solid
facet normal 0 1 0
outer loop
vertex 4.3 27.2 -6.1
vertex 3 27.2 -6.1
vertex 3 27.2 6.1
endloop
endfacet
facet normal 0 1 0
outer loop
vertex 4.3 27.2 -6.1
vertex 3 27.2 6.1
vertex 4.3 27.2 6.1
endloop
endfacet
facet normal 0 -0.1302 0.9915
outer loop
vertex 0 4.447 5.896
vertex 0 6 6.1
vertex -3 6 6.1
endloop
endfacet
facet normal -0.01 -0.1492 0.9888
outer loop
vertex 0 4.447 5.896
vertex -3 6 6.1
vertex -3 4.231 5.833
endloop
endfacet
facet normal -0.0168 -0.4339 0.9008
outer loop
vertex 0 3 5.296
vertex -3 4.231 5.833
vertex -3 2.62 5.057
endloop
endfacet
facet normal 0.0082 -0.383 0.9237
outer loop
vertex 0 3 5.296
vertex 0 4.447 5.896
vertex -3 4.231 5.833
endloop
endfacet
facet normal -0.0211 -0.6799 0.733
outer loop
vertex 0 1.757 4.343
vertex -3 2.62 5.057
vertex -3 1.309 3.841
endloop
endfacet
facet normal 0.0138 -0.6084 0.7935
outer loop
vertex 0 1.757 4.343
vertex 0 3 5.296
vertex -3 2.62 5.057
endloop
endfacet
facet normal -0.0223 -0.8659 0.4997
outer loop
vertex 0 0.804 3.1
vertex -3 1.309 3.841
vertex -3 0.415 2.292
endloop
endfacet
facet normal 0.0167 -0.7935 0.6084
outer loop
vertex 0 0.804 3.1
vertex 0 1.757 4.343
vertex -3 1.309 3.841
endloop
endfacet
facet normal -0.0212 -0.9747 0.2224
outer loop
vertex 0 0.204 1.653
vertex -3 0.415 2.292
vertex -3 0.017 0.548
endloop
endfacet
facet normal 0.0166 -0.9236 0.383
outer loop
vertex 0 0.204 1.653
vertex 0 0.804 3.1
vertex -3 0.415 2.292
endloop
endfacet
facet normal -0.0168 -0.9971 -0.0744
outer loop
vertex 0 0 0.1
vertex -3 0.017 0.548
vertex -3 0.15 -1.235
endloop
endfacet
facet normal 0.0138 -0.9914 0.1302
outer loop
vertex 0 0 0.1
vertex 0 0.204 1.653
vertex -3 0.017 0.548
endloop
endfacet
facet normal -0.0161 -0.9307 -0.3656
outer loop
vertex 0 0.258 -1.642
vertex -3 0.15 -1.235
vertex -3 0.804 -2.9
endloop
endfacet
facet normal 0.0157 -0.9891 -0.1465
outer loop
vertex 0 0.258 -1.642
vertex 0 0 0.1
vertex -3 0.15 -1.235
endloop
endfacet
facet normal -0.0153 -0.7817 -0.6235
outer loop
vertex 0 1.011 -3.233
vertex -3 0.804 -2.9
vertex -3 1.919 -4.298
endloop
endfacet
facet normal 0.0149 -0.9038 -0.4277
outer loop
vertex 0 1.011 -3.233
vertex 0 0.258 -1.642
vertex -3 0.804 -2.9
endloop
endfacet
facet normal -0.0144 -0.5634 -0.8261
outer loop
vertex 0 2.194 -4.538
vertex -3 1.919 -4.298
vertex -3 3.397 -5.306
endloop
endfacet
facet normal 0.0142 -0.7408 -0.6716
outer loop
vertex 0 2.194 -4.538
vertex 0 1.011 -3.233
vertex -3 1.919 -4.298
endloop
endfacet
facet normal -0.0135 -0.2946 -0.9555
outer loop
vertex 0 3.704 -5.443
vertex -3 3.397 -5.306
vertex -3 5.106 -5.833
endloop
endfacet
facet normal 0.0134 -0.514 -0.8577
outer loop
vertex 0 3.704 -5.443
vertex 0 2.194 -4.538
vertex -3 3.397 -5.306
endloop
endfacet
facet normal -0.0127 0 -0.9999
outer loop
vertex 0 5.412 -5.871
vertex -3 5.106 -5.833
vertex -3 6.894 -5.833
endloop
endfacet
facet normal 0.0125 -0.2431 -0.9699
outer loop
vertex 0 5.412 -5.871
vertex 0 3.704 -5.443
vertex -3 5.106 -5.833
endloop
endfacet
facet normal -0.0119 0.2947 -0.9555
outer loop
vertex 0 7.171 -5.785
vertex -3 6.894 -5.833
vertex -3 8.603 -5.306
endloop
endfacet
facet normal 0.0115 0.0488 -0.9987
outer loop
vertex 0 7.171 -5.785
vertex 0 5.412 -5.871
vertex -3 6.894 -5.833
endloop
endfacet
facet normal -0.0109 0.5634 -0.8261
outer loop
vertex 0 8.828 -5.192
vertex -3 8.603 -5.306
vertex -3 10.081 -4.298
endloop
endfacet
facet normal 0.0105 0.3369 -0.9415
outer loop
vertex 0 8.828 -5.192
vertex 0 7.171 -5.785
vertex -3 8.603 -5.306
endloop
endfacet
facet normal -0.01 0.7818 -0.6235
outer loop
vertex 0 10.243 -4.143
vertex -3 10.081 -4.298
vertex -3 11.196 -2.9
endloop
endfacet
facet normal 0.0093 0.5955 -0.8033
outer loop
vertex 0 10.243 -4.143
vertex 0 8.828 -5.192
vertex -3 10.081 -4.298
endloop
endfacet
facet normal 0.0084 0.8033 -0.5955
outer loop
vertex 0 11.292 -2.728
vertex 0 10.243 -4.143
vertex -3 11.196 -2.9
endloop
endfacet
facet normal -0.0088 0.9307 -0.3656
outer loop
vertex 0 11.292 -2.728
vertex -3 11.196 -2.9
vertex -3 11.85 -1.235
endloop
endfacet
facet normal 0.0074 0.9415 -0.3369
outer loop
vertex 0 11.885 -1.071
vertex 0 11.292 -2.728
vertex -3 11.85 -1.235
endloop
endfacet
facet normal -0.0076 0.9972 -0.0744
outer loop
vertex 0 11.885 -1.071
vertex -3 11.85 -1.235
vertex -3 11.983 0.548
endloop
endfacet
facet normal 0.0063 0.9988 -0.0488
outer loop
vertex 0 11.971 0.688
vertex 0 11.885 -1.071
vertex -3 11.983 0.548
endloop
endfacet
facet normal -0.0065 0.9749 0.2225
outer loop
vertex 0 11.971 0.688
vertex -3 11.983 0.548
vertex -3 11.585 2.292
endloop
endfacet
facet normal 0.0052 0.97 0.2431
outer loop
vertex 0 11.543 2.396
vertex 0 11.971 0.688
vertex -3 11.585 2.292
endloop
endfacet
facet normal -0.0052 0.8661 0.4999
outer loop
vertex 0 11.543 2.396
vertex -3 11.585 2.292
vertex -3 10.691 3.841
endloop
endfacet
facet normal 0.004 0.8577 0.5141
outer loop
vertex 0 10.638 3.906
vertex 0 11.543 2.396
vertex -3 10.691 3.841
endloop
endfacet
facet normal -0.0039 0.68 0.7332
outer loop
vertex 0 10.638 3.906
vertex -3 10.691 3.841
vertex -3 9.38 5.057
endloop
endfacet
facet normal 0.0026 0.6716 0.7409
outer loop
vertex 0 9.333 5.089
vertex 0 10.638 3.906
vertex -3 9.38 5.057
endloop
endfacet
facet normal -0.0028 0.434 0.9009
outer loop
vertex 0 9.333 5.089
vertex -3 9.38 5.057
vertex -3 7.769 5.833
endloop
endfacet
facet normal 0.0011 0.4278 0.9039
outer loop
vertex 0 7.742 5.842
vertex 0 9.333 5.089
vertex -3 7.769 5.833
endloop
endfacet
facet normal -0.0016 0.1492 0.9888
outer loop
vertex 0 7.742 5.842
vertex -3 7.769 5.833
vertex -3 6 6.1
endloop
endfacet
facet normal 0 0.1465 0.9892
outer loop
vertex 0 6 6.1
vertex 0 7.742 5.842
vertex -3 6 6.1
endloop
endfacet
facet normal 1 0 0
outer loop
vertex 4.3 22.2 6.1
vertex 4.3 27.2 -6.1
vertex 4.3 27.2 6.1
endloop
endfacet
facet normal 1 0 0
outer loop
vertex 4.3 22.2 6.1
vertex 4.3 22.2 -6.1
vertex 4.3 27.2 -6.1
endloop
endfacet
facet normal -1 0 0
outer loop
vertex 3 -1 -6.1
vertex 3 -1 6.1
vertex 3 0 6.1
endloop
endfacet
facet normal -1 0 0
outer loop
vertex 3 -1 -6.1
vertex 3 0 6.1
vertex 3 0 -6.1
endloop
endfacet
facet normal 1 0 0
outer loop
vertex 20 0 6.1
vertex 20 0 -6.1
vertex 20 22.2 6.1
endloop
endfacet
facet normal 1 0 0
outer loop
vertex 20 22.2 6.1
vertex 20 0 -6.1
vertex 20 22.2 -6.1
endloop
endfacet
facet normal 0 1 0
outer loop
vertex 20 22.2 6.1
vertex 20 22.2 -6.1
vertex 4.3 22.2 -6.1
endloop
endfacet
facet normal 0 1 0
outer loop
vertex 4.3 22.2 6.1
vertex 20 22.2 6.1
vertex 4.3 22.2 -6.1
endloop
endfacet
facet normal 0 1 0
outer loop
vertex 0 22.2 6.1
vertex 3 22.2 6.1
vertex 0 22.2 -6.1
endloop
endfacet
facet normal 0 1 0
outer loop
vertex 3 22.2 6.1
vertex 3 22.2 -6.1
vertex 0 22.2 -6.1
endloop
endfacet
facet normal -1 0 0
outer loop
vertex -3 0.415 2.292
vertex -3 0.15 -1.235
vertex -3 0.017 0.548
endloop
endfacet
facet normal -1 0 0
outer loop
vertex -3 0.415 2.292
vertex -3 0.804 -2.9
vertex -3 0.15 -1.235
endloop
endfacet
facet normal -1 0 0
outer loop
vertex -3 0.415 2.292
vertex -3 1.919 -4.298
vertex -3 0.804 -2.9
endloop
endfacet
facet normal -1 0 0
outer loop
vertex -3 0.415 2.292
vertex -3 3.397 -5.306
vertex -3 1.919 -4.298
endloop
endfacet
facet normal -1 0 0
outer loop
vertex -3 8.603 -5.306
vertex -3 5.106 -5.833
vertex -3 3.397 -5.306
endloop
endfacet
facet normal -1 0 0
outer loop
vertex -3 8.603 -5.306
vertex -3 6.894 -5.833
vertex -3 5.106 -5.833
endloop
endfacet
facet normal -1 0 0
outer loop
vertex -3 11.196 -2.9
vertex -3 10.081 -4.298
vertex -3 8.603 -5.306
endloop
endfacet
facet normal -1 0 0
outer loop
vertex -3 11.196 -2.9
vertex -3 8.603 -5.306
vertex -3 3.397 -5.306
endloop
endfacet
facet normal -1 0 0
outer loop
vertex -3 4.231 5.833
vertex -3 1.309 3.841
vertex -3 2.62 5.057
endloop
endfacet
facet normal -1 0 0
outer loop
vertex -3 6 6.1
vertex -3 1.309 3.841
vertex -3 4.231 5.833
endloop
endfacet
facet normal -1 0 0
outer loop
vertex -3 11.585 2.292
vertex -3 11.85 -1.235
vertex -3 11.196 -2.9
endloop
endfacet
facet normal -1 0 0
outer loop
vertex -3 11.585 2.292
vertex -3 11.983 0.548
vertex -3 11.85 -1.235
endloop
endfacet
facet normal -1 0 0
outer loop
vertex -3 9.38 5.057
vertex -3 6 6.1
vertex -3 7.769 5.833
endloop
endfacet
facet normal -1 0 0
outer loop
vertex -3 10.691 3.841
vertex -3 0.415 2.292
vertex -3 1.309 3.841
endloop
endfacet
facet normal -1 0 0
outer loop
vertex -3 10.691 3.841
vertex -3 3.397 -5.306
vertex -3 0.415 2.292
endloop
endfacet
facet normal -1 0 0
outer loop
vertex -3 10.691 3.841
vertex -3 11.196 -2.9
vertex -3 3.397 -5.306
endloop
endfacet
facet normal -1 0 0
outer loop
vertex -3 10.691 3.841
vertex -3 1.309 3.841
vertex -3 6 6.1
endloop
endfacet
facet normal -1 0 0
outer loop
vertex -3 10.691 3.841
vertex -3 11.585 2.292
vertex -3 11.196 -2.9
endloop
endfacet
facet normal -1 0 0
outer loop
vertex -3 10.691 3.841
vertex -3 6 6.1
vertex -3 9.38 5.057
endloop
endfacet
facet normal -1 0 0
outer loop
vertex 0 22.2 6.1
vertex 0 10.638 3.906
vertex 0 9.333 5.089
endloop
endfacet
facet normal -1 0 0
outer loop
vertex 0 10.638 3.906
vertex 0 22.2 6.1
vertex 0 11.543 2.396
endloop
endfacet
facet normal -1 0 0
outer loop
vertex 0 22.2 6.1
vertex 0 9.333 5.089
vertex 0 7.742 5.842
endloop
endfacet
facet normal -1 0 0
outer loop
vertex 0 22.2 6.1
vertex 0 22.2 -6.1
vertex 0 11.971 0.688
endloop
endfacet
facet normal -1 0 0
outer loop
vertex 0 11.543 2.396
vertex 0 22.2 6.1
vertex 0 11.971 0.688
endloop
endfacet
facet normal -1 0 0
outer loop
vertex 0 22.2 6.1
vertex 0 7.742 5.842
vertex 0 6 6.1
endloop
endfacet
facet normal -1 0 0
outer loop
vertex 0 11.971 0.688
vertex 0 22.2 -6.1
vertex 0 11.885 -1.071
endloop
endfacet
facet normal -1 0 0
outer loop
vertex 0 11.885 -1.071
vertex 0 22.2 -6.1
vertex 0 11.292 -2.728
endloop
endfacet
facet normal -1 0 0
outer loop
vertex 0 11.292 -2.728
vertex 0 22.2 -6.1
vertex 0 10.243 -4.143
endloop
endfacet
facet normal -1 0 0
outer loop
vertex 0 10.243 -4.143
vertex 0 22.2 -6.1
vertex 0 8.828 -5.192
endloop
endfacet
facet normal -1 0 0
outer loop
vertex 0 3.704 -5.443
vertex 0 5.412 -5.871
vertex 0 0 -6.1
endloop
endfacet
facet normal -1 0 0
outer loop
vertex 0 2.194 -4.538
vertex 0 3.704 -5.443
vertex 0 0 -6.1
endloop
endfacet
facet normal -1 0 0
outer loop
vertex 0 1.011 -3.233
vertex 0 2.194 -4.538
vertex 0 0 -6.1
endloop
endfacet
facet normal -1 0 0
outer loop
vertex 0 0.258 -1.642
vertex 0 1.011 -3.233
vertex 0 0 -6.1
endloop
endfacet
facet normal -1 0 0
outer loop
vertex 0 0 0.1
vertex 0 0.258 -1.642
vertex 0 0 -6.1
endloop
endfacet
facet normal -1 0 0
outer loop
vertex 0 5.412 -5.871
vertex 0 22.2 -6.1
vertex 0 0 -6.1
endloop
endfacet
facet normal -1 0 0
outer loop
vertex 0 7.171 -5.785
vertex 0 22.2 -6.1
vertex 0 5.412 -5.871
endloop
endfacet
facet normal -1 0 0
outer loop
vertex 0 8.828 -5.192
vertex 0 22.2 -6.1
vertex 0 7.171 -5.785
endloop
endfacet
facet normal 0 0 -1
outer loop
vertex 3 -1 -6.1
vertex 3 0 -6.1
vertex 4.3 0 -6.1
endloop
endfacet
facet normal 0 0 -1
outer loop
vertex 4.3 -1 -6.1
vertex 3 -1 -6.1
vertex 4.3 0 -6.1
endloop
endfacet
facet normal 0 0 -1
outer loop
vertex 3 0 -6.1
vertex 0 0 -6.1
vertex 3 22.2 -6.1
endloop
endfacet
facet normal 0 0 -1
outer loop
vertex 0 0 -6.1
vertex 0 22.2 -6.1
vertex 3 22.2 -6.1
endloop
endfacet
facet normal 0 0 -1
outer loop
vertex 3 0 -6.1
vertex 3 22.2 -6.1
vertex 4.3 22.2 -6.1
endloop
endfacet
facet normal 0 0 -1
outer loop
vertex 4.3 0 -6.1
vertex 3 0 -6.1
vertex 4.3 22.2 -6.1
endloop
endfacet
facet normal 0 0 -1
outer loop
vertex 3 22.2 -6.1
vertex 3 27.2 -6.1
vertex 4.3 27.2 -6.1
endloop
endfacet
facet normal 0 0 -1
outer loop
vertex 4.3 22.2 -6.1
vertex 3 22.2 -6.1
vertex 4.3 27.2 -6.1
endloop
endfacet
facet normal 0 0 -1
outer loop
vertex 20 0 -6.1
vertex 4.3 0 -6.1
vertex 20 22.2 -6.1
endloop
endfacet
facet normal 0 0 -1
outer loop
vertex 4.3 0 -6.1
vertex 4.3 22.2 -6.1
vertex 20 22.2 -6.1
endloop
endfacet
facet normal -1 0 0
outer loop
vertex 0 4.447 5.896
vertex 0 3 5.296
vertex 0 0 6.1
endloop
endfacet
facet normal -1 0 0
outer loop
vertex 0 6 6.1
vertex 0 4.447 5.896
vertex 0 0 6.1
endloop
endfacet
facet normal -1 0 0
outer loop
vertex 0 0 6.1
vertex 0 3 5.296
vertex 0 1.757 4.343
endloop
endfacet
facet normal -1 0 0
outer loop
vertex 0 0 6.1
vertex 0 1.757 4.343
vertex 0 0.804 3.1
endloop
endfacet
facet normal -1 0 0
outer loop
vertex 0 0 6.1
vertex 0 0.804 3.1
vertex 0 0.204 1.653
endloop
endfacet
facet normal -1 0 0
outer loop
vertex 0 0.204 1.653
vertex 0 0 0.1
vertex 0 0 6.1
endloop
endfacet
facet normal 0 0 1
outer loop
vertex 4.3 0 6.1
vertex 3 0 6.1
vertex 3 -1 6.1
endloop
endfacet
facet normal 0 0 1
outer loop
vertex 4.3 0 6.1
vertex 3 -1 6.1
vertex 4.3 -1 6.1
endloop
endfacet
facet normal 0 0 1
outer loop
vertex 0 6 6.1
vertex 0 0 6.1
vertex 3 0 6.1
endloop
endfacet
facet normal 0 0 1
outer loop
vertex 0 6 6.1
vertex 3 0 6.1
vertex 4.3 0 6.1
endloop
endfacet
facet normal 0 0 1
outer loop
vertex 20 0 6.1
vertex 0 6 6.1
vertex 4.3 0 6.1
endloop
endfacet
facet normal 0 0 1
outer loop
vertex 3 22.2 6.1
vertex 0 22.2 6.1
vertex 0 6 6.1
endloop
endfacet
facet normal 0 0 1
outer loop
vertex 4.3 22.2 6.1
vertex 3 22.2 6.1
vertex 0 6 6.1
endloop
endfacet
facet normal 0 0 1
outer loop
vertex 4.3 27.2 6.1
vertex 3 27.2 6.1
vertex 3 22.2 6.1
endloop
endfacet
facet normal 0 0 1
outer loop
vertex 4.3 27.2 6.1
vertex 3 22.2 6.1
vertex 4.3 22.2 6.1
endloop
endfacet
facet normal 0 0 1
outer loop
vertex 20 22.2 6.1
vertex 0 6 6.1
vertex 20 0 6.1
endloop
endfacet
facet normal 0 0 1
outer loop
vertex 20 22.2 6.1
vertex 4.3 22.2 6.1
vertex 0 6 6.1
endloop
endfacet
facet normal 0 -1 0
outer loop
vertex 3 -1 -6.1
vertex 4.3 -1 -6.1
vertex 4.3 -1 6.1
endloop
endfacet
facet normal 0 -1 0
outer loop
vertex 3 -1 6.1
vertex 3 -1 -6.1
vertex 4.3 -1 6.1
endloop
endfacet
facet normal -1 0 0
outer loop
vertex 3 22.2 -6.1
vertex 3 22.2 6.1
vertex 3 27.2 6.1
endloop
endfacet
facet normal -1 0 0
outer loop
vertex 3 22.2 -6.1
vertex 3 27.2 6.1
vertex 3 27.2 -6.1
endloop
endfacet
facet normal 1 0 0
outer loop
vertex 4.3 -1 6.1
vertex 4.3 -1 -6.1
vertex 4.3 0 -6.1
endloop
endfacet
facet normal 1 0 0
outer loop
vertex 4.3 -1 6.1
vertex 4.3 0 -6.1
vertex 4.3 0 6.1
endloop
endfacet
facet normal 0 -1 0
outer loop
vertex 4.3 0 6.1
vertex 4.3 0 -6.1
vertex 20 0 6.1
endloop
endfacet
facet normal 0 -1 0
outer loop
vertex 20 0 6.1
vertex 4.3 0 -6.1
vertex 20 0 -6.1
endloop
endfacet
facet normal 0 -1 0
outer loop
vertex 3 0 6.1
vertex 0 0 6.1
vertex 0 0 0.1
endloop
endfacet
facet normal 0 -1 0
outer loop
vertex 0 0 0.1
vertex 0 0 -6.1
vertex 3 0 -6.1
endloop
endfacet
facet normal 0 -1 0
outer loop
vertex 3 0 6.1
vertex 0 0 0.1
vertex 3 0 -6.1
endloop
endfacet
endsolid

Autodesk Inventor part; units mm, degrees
ref_plane "YZ Plane" through (0, 0, 0) normal (1, 0, 0) x (0, 1, 0)
ref_plane "XZ Plane" through (0, 0, 0) normal (0, 1, 0) x (-1, 0, 0)
ref_plane "XY Plane" through (0, 0, 0) normal (0, 0, 1) x (1, 0, 0)
sketch "Sketch1" plane through (0, 0, 0) normal (0, 0, 1) x (1, 0, 0)
  line L0 (0, 0) -> (20, 0)
  line L1 (20, 0) -> (20, 22.2)
  line L2 (20, 22.2) -> (0, 22.2)
  line L3 (0, 22.2) -> (0, 0)
  dimension "d0" = 20
  dimension "d1" = 22.2
extrude "Extrusion1" add sketch "Sketch1" along normal mid plane 12.2
sketch "Sketch2" plane through (0, 0, 6.1) normal (-1, 0, 0) x (0, 0, 1)
  circle A0 centre (-6, 6) radius 6
  line L0 (0, 0) -> (-12.2, 0) projected
  line L1 (0, 22.2) -> (0, 0) projected
  point P0 (-6.1, 0)
  dimension "d4" = 6
  dimension "d5" = 6
  dimension "d6" = 12
extrude "Extrusion2" add sketch "Sketch2" along normal blind 3 contours A0
sketch "Sketch3" plane through (0, 22.2, 6.1) normal (0, 1, 0) x (1, 0, 0)
  line L0 (0, 0) -> (20, 0) projected
  line L1 (3, 12.2) -> (4.3, 12.2)
  line L2 (4.3, 12.2) -> (4.3, 0)
  line L3 (4.3, 0) -> (3, 0)
  line L4 (3, 0) -> (3, 12.2)
  line L5 (0, 12.2) -> (0, 0) projected
  point P0 (0, 6.1)
  dimension "d9" = 3
  dimension "d10" = 1.3
  dimension "d11" = 12.2
extrude "Extrusion3" add sketch "Sketch3" along normal blind 5 and the other way blind 27.2
sketch "Sketch5" plane through (4.3, -5, 6.1) normal (1, 0, 0) x (0, 0, -1)
  line L0 (0, 0) -> (12.2, 0)
  line L1 (12.2, 0) -> (12.2, 4)
  line L2 (12.2, 4) -> (0, 4)
  line L3 (0, 4) -> (0, 0)
  line L4 (0, 5) -> (0, 0) projected
  line L5 (12.2, 5) -> (12.2, 0) projected
  line L6 (12.2, 0) -> (0, 0) projected
  line L7 (12.2, 5) -> (0, 5) projected
  point P0 (6.1, 5)
  dimension "d24" = 1
extrude "Extrusion5" cut sketch "Sketch5" against normal blind 2 contours L3 L2 L1 L0
properties part number "Servo"
